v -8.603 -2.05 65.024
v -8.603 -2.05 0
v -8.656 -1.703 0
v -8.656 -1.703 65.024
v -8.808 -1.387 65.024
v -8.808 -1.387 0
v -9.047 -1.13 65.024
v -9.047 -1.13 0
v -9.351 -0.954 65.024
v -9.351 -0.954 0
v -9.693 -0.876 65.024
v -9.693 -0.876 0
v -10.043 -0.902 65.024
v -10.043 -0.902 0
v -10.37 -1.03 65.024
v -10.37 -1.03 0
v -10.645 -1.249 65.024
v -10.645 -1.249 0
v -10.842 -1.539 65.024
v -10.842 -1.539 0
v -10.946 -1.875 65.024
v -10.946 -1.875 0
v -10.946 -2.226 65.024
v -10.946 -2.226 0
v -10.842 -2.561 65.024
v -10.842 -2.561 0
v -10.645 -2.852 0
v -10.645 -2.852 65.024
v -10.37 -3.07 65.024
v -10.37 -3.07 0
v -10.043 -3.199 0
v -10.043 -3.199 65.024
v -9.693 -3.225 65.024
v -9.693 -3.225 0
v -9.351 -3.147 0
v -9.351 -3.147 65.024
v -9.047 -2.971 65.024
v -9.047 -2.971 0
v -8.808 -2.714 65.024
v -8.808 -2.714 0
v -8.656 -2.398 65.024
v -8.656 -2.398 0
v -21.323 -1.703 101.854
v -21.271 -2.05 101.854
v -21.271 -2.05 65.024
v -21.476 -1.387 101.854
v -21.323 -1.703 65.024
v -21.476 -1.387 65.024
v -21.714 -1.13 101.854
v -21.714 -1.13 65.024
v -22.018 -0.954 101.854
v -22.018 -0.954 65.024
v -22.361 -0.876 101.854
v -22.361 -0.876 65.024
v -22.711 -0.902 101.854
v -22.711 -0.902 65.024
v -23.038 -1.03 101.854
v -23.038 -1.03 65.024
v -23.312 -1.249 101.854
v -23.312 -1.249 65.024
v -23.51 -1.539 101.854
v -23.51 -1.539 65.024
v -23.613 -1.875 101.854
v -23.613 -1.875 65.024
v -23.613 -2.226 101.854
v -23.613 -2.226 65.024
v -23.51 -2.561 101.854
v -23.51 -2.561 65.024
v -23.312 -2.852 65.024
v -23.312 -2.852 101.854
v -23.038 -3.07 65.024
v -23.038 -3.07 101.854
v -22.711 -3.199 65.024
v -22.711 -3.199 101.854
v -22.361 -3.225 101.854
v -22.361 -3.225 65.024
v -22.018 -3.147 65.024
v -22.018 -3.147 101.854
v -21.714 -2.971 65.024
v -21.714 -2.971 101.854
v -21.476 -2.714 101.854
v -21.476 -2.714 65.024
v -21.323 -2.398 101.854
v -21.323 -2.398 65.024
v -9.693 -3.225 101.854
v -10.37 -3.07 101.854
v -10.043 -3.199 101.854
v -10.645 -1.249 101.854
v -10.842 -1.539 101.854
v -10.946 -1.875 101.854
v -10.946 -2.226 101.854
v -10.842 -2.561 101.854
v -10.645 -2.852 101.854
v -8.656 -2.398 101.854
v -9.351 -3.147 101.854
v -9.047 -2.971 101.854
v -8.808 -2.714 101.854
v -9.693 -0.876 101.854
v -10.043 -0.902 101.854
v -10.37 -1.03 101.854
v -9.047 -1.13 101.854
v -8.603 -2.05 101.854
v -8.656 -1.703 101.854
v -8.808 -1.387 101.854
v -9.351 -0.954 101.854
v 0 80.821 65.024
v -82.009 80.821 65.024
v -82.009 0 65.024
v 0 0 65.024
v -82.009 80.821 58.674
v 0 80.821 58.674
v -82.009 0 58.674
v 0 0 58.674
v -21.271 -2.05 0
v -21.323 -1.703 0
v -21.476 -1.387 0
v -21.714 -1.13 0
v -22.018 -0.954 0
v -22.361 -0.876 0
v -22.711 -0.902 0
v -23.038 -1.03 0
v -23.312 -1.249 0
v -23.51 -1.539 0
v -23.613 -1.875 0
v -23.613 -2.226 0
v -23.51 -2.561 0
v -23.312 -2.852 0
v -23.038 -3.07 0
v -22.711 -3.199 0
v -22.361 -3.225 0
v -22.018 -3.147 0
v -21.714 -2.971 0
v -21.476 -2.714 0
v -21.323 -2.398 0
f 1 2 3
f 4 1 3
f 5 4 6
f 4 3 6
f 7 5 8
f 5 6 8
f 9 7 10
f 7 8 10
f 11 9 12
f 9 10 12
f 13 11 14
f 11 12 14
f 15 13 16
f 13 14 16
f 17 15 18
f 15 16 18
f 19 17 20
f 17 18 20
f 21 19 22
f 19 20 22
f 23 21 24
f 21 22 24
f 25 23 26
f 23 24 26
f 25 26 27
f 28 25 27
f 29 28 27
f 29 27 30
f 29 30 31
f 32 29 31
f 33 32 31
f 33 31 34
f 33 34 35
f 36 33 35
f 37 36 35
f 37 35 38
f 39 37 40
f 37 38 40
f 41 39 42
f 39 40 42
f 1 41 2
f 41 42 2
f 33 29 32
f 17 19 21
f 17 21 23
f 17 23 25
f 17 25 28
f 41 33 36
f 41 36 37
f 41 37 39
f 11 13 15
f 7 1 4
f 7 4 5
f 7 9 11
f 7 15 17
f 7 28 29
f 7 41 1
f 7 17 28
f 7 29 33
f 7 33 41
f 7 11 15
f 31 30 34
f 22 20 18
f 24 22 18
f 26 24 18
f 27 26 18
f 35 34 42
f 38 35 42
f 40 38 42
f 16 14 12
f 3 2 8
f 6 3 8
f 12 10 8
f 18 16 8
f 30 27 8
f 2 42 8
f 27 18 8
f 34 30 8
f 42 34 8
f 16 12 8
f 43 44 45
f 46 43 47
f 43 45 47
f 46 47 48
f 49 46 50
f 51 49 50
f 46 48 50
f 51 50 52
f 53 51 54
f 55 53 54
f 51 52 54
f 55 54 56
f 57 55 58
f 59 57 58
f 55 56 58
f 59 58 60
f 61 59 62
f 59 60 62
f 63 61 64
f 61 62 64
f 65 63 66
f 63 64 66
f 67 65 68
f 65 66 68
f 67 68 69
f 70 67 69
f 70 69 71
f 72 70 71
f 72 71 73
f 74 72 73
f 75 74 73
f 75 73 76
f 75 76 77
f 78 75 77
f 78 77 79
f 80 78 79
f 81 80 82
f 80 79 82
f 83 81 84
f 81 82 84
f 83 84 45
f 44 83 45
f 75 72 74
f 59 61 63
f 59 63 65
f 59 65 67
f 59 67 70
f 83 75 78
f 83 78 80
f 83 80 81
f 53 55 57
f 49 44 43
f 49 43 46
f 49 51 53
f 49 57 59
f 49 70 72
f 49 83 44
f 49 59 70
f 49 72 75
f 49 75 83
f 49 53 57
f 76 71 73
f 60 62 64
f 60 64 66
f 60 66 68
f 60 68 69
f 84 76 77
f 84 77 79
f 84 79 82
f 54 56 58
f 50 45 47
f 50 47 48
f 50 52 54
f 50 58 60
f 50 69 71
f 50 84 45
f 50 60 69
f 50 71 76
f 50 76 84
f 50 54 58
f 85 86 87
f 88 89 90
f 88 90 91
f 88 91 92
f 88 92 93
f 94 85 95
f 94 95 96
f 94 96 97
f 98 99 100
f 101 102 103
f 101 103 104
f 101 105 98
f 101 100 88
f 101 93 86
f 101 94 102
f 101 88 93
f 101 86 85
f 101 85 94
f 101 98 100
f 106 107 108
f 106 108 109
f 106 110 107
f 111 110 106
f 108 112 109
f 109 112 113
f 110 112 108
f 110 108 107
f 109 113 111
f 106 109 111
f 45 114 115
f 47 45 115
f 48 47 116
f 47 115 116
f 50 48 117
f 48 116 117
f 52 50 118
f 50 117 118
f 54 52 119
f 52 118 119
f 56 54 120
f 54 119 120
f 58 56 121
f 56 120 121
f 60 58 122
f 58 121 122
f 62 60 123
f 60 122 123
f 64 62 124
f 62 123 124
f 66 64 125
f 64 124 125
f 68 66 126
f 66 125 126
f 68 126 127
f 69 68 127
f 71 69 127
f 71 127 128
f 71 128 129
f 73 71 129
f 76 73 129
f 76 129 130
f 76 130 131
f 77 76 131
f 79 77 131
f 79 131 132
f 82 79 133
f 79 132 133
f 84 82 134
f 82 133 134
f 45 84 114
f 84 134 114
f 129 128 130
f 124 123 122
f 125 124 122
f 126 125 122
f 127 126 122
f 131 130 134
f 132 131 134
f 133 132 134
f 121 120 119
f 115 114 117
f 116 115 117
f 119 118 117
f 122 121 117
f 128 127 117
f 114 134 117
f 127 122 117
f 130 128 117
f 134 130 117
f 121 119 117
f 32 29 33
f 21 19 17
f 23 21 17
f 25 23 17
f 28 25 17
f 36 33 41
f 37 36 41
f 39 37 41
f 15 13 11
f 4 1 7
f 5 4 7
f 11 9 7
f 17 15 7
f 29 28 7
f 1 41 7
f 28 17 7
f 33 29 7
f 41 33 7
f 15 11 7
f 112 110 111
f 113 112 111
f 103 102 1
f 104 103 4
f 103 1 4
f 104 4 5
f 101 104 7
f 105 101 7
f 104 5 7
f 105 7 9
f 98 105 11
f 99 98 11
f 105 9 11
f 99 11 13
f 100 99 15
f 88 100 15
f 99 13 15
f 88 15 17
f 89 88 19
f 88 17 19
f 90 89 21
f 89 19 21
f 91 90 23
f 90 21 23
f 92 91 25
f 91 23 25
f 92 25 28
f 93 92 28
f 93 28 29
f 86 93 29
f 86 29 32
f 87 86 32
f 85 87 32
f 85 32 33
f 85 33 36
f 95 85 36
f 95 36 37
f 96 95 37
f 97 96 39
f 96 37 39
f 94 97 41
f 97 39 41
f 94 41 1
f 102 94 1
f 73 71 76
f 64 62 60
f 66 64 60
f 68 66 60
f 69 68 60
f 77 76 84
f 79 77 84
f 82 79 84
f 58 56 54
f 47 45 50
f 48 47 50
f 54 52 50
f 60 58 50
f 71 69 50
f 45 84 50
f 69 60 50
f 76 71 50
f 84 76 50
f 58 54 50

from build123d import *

# Parameters (mm, degrees)
F0_W     = 82.0087715983
F0_H     = 80.8207094669
F2_DEPTH = 65.024
F1_R     = 1.1777920209
F3_DEPTH = 56.642
F4_DEPTH = 58.674
F5_DEPTH = 36.83


with BuildPart() as f2:
    # F0 (on Top) → F2 (new body)
    with BuildSketch(Plane.XY):
        with Locations((-41.0043857992, 40.4103547335)):
            Rectangle(F0_W, F0_H)
    extrude(amount=F2_DEPTH)

    # F3 (add): a face of the model
    f3_faces = [f2.faces().sort_by_distance(p)[0] for p in [
        (-41.0043857992, 40.4103547335, 0),
    ]]
    extrude(f3_faces, amount=-F3_DEPTH)

    # F4 (cut): a face of the model
    f4_faces = [f2.faces().sort_by_distance(p)[0] for p in [
        (-41.0043857992, 40.4103547335, 0),
    ]]
    extrude(f4_faces, amount=-F4_DEPTH, mode=Mode.SUBTRACT)


with BuildPart() as f2b:
    # F1 (on face) → F2, piece 2 (new body)
    with BuildSketch(Plane.XY):
        with Locations((-9.7812432796, -2.0504272543)):
            Circle(F1_R)
    extrude(amount=F2_DEPTH)


with BuildPart() as f2c:
    # F1 (on face) → F2, piece 3 (new body)
    with BuildSketch(Plane.XY):
        with Locations((-22.4487129599, -2.0504272543)):
            Circle(F1_R)
    extrude(amount=F2_DEPTH)


with BuildPart() as f5:
    # F5 (new): a face of the model
    f5_faces = [f2c.part.faces().sort_by_distance(p)[0] for p in [
        (-22.4487129599, -2.0504272543, 65.024),
    ]]
    extrude(f5_faces, amount=F5_DEPTH)


with BuildPart() as f5b:
    # F5#2 (new): a face of the model
    f5_2_faces = [f2b.part.faces().sort_by_distance(p)[0] for p in [
        (-9.7812432796, -2.0504272543, 65.024),
    ]]
    extrude(f5_2_faces, amount=F5_DEPTH)


solid = Compound([f2.part, f2b.part, f2c.part, f5.part, f5b.part])
